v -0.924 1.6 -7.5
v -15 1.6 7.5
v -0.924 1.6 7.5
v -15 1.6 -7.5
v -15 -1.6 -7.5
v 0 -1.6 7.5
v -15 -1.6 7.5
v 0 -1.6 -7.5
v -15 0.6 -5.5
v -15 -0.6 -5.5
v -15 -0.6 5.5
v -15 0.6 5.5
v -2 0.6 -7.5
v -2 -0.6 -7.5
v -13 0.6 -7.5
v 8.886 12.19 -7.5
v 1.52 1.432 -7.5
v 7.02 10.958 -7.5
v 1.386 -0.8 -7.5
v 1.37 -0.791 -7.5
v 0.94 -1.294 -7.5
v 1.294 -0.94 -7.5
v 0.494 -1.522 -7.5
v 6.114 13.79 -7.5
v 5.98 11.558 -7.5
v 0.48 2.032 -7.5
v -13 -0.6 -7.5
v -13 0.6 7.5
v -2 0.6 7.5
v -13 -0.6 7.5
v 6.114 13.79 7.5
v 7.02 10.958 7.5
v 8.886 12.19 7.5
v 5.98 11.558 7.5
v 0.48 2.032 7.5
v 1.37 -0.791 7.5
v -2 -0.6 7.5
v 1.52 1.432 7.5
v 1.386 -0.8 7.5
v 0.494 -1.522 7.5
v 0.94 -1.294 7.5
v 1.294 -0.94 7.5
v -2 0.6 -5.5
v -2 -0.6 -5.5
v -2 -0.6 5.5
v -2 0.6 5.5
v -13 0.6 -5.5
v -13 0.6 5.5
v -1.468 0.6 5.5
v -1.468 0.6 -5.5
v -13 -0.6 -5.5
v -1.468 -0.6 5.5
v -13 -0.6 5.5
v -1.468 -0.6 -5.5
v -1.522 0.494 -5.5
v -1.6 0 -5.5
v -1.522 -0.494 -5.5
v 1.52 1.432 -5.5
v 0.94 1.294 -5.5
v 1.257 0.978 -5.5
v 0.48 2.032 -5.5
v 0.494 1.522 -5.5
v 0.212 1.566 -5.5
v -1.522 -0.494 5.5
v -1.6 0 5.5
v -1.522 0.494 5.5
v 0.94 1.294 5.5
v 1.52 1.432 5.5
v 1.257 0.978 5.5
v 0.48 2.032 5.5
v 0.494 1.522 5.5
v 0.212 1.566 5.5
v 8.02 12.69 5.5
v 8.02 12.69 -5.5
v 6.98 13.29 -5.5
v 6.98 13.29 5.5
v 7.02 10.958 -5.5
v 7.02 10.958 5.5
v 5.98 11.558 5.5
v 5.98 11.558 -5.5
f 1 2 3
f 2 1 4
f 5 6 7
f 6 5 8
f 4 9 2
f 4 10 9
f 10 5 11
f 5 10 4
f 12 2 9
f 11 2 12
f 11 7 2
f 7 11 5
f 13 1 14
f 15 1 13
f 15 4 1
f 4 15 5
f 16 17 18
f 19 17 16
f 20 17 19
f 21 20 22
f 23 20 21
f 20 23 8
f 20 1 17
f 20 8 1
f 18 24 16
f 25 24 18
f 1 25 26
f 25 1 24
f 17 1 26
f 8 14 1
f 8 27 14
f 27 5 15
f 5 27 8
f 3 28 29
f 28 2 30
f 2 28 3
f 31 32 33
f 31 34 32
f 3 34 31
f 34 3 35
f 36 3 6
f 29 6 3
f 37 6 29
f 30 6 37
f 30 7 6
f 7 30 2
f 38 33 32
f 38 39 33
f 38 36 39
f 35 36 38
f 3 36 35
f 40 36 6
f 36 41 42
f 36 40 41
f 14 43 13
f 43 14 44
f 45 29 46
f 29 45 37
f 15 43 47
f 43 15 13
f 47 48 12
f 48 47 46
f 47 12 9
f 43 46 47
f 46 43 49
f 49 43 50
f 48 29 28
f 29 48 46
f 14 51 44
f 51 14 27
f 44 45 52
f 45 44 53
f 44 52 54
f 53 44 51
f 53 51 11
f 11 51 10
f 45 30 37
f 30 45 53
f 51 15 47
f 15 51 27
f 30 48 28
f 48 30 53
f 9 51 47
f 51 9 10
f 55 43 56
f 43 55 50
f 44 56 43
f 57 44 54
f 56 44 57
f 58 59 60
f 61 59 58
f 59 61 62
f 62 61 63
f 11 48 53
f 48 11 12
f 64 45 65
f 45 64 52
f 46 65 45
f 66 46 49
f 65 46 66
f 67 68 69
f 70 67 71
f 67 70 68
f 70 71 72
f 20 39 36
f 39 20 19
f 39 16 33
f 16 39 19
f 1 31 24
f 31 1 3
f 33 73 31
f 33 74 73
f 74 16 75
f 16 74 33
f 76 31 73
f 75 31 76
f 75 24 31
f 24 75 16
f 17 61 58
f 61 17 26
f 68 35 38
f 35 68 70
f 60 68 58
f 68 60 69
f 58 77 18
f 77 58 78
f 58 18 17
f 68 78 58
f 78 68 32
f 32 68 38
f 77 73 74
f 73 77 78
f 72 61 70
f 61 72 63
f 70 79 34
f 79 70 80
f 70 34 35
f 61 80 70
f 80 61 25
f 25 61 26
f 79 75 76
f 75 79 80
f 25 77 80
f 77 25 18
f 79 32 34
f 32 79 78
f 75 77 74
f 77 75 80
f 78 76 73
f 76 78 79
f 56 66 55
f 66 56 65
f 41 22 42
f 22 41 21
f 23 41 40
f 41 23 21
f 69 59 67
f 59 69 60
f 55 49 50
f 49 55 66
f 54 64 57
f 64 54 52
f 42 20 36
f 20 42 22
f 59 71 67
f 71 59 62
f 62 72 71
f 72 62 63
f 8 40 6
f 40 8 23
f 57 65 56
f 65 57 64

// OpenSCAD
$fn = 20;

lado          = 15;
alto          = 3.2;
hueco         = 1;
margen_hueco  = 0.2;
hueco_a_borde = 2;

/// 

lado2       = lado / 2;
alto2       = alto / 2;
alto4       = alto / 4;

///

angulo(120, lado, lado);

//cara(lado, lado);

module angulo(grados, lado1, lado2) {
    lado2_2 = lado2 / 2;
    
    rotate([-90]) {
        translate([-lado2_2, 0]) cara(lado1, lado2);
        rotate([90]) cylinder(lado2, d=alto, center=true);
        rotate([0, grados]) translate([-lado2_2, 0]) cara(lado1, lado1);
    }
}

module cara(lado1, lado2) {
    difference() {
        cube([lado, lado2, alto], true);
        cube([lado - 2 * hueco_a_borde, lado2 + 1, hueco + margen_hueco], true);
        cube([lado + 1, lado2 - 2 * hueco_a_borde, hueco + margen_hueco], true);
    }
}
